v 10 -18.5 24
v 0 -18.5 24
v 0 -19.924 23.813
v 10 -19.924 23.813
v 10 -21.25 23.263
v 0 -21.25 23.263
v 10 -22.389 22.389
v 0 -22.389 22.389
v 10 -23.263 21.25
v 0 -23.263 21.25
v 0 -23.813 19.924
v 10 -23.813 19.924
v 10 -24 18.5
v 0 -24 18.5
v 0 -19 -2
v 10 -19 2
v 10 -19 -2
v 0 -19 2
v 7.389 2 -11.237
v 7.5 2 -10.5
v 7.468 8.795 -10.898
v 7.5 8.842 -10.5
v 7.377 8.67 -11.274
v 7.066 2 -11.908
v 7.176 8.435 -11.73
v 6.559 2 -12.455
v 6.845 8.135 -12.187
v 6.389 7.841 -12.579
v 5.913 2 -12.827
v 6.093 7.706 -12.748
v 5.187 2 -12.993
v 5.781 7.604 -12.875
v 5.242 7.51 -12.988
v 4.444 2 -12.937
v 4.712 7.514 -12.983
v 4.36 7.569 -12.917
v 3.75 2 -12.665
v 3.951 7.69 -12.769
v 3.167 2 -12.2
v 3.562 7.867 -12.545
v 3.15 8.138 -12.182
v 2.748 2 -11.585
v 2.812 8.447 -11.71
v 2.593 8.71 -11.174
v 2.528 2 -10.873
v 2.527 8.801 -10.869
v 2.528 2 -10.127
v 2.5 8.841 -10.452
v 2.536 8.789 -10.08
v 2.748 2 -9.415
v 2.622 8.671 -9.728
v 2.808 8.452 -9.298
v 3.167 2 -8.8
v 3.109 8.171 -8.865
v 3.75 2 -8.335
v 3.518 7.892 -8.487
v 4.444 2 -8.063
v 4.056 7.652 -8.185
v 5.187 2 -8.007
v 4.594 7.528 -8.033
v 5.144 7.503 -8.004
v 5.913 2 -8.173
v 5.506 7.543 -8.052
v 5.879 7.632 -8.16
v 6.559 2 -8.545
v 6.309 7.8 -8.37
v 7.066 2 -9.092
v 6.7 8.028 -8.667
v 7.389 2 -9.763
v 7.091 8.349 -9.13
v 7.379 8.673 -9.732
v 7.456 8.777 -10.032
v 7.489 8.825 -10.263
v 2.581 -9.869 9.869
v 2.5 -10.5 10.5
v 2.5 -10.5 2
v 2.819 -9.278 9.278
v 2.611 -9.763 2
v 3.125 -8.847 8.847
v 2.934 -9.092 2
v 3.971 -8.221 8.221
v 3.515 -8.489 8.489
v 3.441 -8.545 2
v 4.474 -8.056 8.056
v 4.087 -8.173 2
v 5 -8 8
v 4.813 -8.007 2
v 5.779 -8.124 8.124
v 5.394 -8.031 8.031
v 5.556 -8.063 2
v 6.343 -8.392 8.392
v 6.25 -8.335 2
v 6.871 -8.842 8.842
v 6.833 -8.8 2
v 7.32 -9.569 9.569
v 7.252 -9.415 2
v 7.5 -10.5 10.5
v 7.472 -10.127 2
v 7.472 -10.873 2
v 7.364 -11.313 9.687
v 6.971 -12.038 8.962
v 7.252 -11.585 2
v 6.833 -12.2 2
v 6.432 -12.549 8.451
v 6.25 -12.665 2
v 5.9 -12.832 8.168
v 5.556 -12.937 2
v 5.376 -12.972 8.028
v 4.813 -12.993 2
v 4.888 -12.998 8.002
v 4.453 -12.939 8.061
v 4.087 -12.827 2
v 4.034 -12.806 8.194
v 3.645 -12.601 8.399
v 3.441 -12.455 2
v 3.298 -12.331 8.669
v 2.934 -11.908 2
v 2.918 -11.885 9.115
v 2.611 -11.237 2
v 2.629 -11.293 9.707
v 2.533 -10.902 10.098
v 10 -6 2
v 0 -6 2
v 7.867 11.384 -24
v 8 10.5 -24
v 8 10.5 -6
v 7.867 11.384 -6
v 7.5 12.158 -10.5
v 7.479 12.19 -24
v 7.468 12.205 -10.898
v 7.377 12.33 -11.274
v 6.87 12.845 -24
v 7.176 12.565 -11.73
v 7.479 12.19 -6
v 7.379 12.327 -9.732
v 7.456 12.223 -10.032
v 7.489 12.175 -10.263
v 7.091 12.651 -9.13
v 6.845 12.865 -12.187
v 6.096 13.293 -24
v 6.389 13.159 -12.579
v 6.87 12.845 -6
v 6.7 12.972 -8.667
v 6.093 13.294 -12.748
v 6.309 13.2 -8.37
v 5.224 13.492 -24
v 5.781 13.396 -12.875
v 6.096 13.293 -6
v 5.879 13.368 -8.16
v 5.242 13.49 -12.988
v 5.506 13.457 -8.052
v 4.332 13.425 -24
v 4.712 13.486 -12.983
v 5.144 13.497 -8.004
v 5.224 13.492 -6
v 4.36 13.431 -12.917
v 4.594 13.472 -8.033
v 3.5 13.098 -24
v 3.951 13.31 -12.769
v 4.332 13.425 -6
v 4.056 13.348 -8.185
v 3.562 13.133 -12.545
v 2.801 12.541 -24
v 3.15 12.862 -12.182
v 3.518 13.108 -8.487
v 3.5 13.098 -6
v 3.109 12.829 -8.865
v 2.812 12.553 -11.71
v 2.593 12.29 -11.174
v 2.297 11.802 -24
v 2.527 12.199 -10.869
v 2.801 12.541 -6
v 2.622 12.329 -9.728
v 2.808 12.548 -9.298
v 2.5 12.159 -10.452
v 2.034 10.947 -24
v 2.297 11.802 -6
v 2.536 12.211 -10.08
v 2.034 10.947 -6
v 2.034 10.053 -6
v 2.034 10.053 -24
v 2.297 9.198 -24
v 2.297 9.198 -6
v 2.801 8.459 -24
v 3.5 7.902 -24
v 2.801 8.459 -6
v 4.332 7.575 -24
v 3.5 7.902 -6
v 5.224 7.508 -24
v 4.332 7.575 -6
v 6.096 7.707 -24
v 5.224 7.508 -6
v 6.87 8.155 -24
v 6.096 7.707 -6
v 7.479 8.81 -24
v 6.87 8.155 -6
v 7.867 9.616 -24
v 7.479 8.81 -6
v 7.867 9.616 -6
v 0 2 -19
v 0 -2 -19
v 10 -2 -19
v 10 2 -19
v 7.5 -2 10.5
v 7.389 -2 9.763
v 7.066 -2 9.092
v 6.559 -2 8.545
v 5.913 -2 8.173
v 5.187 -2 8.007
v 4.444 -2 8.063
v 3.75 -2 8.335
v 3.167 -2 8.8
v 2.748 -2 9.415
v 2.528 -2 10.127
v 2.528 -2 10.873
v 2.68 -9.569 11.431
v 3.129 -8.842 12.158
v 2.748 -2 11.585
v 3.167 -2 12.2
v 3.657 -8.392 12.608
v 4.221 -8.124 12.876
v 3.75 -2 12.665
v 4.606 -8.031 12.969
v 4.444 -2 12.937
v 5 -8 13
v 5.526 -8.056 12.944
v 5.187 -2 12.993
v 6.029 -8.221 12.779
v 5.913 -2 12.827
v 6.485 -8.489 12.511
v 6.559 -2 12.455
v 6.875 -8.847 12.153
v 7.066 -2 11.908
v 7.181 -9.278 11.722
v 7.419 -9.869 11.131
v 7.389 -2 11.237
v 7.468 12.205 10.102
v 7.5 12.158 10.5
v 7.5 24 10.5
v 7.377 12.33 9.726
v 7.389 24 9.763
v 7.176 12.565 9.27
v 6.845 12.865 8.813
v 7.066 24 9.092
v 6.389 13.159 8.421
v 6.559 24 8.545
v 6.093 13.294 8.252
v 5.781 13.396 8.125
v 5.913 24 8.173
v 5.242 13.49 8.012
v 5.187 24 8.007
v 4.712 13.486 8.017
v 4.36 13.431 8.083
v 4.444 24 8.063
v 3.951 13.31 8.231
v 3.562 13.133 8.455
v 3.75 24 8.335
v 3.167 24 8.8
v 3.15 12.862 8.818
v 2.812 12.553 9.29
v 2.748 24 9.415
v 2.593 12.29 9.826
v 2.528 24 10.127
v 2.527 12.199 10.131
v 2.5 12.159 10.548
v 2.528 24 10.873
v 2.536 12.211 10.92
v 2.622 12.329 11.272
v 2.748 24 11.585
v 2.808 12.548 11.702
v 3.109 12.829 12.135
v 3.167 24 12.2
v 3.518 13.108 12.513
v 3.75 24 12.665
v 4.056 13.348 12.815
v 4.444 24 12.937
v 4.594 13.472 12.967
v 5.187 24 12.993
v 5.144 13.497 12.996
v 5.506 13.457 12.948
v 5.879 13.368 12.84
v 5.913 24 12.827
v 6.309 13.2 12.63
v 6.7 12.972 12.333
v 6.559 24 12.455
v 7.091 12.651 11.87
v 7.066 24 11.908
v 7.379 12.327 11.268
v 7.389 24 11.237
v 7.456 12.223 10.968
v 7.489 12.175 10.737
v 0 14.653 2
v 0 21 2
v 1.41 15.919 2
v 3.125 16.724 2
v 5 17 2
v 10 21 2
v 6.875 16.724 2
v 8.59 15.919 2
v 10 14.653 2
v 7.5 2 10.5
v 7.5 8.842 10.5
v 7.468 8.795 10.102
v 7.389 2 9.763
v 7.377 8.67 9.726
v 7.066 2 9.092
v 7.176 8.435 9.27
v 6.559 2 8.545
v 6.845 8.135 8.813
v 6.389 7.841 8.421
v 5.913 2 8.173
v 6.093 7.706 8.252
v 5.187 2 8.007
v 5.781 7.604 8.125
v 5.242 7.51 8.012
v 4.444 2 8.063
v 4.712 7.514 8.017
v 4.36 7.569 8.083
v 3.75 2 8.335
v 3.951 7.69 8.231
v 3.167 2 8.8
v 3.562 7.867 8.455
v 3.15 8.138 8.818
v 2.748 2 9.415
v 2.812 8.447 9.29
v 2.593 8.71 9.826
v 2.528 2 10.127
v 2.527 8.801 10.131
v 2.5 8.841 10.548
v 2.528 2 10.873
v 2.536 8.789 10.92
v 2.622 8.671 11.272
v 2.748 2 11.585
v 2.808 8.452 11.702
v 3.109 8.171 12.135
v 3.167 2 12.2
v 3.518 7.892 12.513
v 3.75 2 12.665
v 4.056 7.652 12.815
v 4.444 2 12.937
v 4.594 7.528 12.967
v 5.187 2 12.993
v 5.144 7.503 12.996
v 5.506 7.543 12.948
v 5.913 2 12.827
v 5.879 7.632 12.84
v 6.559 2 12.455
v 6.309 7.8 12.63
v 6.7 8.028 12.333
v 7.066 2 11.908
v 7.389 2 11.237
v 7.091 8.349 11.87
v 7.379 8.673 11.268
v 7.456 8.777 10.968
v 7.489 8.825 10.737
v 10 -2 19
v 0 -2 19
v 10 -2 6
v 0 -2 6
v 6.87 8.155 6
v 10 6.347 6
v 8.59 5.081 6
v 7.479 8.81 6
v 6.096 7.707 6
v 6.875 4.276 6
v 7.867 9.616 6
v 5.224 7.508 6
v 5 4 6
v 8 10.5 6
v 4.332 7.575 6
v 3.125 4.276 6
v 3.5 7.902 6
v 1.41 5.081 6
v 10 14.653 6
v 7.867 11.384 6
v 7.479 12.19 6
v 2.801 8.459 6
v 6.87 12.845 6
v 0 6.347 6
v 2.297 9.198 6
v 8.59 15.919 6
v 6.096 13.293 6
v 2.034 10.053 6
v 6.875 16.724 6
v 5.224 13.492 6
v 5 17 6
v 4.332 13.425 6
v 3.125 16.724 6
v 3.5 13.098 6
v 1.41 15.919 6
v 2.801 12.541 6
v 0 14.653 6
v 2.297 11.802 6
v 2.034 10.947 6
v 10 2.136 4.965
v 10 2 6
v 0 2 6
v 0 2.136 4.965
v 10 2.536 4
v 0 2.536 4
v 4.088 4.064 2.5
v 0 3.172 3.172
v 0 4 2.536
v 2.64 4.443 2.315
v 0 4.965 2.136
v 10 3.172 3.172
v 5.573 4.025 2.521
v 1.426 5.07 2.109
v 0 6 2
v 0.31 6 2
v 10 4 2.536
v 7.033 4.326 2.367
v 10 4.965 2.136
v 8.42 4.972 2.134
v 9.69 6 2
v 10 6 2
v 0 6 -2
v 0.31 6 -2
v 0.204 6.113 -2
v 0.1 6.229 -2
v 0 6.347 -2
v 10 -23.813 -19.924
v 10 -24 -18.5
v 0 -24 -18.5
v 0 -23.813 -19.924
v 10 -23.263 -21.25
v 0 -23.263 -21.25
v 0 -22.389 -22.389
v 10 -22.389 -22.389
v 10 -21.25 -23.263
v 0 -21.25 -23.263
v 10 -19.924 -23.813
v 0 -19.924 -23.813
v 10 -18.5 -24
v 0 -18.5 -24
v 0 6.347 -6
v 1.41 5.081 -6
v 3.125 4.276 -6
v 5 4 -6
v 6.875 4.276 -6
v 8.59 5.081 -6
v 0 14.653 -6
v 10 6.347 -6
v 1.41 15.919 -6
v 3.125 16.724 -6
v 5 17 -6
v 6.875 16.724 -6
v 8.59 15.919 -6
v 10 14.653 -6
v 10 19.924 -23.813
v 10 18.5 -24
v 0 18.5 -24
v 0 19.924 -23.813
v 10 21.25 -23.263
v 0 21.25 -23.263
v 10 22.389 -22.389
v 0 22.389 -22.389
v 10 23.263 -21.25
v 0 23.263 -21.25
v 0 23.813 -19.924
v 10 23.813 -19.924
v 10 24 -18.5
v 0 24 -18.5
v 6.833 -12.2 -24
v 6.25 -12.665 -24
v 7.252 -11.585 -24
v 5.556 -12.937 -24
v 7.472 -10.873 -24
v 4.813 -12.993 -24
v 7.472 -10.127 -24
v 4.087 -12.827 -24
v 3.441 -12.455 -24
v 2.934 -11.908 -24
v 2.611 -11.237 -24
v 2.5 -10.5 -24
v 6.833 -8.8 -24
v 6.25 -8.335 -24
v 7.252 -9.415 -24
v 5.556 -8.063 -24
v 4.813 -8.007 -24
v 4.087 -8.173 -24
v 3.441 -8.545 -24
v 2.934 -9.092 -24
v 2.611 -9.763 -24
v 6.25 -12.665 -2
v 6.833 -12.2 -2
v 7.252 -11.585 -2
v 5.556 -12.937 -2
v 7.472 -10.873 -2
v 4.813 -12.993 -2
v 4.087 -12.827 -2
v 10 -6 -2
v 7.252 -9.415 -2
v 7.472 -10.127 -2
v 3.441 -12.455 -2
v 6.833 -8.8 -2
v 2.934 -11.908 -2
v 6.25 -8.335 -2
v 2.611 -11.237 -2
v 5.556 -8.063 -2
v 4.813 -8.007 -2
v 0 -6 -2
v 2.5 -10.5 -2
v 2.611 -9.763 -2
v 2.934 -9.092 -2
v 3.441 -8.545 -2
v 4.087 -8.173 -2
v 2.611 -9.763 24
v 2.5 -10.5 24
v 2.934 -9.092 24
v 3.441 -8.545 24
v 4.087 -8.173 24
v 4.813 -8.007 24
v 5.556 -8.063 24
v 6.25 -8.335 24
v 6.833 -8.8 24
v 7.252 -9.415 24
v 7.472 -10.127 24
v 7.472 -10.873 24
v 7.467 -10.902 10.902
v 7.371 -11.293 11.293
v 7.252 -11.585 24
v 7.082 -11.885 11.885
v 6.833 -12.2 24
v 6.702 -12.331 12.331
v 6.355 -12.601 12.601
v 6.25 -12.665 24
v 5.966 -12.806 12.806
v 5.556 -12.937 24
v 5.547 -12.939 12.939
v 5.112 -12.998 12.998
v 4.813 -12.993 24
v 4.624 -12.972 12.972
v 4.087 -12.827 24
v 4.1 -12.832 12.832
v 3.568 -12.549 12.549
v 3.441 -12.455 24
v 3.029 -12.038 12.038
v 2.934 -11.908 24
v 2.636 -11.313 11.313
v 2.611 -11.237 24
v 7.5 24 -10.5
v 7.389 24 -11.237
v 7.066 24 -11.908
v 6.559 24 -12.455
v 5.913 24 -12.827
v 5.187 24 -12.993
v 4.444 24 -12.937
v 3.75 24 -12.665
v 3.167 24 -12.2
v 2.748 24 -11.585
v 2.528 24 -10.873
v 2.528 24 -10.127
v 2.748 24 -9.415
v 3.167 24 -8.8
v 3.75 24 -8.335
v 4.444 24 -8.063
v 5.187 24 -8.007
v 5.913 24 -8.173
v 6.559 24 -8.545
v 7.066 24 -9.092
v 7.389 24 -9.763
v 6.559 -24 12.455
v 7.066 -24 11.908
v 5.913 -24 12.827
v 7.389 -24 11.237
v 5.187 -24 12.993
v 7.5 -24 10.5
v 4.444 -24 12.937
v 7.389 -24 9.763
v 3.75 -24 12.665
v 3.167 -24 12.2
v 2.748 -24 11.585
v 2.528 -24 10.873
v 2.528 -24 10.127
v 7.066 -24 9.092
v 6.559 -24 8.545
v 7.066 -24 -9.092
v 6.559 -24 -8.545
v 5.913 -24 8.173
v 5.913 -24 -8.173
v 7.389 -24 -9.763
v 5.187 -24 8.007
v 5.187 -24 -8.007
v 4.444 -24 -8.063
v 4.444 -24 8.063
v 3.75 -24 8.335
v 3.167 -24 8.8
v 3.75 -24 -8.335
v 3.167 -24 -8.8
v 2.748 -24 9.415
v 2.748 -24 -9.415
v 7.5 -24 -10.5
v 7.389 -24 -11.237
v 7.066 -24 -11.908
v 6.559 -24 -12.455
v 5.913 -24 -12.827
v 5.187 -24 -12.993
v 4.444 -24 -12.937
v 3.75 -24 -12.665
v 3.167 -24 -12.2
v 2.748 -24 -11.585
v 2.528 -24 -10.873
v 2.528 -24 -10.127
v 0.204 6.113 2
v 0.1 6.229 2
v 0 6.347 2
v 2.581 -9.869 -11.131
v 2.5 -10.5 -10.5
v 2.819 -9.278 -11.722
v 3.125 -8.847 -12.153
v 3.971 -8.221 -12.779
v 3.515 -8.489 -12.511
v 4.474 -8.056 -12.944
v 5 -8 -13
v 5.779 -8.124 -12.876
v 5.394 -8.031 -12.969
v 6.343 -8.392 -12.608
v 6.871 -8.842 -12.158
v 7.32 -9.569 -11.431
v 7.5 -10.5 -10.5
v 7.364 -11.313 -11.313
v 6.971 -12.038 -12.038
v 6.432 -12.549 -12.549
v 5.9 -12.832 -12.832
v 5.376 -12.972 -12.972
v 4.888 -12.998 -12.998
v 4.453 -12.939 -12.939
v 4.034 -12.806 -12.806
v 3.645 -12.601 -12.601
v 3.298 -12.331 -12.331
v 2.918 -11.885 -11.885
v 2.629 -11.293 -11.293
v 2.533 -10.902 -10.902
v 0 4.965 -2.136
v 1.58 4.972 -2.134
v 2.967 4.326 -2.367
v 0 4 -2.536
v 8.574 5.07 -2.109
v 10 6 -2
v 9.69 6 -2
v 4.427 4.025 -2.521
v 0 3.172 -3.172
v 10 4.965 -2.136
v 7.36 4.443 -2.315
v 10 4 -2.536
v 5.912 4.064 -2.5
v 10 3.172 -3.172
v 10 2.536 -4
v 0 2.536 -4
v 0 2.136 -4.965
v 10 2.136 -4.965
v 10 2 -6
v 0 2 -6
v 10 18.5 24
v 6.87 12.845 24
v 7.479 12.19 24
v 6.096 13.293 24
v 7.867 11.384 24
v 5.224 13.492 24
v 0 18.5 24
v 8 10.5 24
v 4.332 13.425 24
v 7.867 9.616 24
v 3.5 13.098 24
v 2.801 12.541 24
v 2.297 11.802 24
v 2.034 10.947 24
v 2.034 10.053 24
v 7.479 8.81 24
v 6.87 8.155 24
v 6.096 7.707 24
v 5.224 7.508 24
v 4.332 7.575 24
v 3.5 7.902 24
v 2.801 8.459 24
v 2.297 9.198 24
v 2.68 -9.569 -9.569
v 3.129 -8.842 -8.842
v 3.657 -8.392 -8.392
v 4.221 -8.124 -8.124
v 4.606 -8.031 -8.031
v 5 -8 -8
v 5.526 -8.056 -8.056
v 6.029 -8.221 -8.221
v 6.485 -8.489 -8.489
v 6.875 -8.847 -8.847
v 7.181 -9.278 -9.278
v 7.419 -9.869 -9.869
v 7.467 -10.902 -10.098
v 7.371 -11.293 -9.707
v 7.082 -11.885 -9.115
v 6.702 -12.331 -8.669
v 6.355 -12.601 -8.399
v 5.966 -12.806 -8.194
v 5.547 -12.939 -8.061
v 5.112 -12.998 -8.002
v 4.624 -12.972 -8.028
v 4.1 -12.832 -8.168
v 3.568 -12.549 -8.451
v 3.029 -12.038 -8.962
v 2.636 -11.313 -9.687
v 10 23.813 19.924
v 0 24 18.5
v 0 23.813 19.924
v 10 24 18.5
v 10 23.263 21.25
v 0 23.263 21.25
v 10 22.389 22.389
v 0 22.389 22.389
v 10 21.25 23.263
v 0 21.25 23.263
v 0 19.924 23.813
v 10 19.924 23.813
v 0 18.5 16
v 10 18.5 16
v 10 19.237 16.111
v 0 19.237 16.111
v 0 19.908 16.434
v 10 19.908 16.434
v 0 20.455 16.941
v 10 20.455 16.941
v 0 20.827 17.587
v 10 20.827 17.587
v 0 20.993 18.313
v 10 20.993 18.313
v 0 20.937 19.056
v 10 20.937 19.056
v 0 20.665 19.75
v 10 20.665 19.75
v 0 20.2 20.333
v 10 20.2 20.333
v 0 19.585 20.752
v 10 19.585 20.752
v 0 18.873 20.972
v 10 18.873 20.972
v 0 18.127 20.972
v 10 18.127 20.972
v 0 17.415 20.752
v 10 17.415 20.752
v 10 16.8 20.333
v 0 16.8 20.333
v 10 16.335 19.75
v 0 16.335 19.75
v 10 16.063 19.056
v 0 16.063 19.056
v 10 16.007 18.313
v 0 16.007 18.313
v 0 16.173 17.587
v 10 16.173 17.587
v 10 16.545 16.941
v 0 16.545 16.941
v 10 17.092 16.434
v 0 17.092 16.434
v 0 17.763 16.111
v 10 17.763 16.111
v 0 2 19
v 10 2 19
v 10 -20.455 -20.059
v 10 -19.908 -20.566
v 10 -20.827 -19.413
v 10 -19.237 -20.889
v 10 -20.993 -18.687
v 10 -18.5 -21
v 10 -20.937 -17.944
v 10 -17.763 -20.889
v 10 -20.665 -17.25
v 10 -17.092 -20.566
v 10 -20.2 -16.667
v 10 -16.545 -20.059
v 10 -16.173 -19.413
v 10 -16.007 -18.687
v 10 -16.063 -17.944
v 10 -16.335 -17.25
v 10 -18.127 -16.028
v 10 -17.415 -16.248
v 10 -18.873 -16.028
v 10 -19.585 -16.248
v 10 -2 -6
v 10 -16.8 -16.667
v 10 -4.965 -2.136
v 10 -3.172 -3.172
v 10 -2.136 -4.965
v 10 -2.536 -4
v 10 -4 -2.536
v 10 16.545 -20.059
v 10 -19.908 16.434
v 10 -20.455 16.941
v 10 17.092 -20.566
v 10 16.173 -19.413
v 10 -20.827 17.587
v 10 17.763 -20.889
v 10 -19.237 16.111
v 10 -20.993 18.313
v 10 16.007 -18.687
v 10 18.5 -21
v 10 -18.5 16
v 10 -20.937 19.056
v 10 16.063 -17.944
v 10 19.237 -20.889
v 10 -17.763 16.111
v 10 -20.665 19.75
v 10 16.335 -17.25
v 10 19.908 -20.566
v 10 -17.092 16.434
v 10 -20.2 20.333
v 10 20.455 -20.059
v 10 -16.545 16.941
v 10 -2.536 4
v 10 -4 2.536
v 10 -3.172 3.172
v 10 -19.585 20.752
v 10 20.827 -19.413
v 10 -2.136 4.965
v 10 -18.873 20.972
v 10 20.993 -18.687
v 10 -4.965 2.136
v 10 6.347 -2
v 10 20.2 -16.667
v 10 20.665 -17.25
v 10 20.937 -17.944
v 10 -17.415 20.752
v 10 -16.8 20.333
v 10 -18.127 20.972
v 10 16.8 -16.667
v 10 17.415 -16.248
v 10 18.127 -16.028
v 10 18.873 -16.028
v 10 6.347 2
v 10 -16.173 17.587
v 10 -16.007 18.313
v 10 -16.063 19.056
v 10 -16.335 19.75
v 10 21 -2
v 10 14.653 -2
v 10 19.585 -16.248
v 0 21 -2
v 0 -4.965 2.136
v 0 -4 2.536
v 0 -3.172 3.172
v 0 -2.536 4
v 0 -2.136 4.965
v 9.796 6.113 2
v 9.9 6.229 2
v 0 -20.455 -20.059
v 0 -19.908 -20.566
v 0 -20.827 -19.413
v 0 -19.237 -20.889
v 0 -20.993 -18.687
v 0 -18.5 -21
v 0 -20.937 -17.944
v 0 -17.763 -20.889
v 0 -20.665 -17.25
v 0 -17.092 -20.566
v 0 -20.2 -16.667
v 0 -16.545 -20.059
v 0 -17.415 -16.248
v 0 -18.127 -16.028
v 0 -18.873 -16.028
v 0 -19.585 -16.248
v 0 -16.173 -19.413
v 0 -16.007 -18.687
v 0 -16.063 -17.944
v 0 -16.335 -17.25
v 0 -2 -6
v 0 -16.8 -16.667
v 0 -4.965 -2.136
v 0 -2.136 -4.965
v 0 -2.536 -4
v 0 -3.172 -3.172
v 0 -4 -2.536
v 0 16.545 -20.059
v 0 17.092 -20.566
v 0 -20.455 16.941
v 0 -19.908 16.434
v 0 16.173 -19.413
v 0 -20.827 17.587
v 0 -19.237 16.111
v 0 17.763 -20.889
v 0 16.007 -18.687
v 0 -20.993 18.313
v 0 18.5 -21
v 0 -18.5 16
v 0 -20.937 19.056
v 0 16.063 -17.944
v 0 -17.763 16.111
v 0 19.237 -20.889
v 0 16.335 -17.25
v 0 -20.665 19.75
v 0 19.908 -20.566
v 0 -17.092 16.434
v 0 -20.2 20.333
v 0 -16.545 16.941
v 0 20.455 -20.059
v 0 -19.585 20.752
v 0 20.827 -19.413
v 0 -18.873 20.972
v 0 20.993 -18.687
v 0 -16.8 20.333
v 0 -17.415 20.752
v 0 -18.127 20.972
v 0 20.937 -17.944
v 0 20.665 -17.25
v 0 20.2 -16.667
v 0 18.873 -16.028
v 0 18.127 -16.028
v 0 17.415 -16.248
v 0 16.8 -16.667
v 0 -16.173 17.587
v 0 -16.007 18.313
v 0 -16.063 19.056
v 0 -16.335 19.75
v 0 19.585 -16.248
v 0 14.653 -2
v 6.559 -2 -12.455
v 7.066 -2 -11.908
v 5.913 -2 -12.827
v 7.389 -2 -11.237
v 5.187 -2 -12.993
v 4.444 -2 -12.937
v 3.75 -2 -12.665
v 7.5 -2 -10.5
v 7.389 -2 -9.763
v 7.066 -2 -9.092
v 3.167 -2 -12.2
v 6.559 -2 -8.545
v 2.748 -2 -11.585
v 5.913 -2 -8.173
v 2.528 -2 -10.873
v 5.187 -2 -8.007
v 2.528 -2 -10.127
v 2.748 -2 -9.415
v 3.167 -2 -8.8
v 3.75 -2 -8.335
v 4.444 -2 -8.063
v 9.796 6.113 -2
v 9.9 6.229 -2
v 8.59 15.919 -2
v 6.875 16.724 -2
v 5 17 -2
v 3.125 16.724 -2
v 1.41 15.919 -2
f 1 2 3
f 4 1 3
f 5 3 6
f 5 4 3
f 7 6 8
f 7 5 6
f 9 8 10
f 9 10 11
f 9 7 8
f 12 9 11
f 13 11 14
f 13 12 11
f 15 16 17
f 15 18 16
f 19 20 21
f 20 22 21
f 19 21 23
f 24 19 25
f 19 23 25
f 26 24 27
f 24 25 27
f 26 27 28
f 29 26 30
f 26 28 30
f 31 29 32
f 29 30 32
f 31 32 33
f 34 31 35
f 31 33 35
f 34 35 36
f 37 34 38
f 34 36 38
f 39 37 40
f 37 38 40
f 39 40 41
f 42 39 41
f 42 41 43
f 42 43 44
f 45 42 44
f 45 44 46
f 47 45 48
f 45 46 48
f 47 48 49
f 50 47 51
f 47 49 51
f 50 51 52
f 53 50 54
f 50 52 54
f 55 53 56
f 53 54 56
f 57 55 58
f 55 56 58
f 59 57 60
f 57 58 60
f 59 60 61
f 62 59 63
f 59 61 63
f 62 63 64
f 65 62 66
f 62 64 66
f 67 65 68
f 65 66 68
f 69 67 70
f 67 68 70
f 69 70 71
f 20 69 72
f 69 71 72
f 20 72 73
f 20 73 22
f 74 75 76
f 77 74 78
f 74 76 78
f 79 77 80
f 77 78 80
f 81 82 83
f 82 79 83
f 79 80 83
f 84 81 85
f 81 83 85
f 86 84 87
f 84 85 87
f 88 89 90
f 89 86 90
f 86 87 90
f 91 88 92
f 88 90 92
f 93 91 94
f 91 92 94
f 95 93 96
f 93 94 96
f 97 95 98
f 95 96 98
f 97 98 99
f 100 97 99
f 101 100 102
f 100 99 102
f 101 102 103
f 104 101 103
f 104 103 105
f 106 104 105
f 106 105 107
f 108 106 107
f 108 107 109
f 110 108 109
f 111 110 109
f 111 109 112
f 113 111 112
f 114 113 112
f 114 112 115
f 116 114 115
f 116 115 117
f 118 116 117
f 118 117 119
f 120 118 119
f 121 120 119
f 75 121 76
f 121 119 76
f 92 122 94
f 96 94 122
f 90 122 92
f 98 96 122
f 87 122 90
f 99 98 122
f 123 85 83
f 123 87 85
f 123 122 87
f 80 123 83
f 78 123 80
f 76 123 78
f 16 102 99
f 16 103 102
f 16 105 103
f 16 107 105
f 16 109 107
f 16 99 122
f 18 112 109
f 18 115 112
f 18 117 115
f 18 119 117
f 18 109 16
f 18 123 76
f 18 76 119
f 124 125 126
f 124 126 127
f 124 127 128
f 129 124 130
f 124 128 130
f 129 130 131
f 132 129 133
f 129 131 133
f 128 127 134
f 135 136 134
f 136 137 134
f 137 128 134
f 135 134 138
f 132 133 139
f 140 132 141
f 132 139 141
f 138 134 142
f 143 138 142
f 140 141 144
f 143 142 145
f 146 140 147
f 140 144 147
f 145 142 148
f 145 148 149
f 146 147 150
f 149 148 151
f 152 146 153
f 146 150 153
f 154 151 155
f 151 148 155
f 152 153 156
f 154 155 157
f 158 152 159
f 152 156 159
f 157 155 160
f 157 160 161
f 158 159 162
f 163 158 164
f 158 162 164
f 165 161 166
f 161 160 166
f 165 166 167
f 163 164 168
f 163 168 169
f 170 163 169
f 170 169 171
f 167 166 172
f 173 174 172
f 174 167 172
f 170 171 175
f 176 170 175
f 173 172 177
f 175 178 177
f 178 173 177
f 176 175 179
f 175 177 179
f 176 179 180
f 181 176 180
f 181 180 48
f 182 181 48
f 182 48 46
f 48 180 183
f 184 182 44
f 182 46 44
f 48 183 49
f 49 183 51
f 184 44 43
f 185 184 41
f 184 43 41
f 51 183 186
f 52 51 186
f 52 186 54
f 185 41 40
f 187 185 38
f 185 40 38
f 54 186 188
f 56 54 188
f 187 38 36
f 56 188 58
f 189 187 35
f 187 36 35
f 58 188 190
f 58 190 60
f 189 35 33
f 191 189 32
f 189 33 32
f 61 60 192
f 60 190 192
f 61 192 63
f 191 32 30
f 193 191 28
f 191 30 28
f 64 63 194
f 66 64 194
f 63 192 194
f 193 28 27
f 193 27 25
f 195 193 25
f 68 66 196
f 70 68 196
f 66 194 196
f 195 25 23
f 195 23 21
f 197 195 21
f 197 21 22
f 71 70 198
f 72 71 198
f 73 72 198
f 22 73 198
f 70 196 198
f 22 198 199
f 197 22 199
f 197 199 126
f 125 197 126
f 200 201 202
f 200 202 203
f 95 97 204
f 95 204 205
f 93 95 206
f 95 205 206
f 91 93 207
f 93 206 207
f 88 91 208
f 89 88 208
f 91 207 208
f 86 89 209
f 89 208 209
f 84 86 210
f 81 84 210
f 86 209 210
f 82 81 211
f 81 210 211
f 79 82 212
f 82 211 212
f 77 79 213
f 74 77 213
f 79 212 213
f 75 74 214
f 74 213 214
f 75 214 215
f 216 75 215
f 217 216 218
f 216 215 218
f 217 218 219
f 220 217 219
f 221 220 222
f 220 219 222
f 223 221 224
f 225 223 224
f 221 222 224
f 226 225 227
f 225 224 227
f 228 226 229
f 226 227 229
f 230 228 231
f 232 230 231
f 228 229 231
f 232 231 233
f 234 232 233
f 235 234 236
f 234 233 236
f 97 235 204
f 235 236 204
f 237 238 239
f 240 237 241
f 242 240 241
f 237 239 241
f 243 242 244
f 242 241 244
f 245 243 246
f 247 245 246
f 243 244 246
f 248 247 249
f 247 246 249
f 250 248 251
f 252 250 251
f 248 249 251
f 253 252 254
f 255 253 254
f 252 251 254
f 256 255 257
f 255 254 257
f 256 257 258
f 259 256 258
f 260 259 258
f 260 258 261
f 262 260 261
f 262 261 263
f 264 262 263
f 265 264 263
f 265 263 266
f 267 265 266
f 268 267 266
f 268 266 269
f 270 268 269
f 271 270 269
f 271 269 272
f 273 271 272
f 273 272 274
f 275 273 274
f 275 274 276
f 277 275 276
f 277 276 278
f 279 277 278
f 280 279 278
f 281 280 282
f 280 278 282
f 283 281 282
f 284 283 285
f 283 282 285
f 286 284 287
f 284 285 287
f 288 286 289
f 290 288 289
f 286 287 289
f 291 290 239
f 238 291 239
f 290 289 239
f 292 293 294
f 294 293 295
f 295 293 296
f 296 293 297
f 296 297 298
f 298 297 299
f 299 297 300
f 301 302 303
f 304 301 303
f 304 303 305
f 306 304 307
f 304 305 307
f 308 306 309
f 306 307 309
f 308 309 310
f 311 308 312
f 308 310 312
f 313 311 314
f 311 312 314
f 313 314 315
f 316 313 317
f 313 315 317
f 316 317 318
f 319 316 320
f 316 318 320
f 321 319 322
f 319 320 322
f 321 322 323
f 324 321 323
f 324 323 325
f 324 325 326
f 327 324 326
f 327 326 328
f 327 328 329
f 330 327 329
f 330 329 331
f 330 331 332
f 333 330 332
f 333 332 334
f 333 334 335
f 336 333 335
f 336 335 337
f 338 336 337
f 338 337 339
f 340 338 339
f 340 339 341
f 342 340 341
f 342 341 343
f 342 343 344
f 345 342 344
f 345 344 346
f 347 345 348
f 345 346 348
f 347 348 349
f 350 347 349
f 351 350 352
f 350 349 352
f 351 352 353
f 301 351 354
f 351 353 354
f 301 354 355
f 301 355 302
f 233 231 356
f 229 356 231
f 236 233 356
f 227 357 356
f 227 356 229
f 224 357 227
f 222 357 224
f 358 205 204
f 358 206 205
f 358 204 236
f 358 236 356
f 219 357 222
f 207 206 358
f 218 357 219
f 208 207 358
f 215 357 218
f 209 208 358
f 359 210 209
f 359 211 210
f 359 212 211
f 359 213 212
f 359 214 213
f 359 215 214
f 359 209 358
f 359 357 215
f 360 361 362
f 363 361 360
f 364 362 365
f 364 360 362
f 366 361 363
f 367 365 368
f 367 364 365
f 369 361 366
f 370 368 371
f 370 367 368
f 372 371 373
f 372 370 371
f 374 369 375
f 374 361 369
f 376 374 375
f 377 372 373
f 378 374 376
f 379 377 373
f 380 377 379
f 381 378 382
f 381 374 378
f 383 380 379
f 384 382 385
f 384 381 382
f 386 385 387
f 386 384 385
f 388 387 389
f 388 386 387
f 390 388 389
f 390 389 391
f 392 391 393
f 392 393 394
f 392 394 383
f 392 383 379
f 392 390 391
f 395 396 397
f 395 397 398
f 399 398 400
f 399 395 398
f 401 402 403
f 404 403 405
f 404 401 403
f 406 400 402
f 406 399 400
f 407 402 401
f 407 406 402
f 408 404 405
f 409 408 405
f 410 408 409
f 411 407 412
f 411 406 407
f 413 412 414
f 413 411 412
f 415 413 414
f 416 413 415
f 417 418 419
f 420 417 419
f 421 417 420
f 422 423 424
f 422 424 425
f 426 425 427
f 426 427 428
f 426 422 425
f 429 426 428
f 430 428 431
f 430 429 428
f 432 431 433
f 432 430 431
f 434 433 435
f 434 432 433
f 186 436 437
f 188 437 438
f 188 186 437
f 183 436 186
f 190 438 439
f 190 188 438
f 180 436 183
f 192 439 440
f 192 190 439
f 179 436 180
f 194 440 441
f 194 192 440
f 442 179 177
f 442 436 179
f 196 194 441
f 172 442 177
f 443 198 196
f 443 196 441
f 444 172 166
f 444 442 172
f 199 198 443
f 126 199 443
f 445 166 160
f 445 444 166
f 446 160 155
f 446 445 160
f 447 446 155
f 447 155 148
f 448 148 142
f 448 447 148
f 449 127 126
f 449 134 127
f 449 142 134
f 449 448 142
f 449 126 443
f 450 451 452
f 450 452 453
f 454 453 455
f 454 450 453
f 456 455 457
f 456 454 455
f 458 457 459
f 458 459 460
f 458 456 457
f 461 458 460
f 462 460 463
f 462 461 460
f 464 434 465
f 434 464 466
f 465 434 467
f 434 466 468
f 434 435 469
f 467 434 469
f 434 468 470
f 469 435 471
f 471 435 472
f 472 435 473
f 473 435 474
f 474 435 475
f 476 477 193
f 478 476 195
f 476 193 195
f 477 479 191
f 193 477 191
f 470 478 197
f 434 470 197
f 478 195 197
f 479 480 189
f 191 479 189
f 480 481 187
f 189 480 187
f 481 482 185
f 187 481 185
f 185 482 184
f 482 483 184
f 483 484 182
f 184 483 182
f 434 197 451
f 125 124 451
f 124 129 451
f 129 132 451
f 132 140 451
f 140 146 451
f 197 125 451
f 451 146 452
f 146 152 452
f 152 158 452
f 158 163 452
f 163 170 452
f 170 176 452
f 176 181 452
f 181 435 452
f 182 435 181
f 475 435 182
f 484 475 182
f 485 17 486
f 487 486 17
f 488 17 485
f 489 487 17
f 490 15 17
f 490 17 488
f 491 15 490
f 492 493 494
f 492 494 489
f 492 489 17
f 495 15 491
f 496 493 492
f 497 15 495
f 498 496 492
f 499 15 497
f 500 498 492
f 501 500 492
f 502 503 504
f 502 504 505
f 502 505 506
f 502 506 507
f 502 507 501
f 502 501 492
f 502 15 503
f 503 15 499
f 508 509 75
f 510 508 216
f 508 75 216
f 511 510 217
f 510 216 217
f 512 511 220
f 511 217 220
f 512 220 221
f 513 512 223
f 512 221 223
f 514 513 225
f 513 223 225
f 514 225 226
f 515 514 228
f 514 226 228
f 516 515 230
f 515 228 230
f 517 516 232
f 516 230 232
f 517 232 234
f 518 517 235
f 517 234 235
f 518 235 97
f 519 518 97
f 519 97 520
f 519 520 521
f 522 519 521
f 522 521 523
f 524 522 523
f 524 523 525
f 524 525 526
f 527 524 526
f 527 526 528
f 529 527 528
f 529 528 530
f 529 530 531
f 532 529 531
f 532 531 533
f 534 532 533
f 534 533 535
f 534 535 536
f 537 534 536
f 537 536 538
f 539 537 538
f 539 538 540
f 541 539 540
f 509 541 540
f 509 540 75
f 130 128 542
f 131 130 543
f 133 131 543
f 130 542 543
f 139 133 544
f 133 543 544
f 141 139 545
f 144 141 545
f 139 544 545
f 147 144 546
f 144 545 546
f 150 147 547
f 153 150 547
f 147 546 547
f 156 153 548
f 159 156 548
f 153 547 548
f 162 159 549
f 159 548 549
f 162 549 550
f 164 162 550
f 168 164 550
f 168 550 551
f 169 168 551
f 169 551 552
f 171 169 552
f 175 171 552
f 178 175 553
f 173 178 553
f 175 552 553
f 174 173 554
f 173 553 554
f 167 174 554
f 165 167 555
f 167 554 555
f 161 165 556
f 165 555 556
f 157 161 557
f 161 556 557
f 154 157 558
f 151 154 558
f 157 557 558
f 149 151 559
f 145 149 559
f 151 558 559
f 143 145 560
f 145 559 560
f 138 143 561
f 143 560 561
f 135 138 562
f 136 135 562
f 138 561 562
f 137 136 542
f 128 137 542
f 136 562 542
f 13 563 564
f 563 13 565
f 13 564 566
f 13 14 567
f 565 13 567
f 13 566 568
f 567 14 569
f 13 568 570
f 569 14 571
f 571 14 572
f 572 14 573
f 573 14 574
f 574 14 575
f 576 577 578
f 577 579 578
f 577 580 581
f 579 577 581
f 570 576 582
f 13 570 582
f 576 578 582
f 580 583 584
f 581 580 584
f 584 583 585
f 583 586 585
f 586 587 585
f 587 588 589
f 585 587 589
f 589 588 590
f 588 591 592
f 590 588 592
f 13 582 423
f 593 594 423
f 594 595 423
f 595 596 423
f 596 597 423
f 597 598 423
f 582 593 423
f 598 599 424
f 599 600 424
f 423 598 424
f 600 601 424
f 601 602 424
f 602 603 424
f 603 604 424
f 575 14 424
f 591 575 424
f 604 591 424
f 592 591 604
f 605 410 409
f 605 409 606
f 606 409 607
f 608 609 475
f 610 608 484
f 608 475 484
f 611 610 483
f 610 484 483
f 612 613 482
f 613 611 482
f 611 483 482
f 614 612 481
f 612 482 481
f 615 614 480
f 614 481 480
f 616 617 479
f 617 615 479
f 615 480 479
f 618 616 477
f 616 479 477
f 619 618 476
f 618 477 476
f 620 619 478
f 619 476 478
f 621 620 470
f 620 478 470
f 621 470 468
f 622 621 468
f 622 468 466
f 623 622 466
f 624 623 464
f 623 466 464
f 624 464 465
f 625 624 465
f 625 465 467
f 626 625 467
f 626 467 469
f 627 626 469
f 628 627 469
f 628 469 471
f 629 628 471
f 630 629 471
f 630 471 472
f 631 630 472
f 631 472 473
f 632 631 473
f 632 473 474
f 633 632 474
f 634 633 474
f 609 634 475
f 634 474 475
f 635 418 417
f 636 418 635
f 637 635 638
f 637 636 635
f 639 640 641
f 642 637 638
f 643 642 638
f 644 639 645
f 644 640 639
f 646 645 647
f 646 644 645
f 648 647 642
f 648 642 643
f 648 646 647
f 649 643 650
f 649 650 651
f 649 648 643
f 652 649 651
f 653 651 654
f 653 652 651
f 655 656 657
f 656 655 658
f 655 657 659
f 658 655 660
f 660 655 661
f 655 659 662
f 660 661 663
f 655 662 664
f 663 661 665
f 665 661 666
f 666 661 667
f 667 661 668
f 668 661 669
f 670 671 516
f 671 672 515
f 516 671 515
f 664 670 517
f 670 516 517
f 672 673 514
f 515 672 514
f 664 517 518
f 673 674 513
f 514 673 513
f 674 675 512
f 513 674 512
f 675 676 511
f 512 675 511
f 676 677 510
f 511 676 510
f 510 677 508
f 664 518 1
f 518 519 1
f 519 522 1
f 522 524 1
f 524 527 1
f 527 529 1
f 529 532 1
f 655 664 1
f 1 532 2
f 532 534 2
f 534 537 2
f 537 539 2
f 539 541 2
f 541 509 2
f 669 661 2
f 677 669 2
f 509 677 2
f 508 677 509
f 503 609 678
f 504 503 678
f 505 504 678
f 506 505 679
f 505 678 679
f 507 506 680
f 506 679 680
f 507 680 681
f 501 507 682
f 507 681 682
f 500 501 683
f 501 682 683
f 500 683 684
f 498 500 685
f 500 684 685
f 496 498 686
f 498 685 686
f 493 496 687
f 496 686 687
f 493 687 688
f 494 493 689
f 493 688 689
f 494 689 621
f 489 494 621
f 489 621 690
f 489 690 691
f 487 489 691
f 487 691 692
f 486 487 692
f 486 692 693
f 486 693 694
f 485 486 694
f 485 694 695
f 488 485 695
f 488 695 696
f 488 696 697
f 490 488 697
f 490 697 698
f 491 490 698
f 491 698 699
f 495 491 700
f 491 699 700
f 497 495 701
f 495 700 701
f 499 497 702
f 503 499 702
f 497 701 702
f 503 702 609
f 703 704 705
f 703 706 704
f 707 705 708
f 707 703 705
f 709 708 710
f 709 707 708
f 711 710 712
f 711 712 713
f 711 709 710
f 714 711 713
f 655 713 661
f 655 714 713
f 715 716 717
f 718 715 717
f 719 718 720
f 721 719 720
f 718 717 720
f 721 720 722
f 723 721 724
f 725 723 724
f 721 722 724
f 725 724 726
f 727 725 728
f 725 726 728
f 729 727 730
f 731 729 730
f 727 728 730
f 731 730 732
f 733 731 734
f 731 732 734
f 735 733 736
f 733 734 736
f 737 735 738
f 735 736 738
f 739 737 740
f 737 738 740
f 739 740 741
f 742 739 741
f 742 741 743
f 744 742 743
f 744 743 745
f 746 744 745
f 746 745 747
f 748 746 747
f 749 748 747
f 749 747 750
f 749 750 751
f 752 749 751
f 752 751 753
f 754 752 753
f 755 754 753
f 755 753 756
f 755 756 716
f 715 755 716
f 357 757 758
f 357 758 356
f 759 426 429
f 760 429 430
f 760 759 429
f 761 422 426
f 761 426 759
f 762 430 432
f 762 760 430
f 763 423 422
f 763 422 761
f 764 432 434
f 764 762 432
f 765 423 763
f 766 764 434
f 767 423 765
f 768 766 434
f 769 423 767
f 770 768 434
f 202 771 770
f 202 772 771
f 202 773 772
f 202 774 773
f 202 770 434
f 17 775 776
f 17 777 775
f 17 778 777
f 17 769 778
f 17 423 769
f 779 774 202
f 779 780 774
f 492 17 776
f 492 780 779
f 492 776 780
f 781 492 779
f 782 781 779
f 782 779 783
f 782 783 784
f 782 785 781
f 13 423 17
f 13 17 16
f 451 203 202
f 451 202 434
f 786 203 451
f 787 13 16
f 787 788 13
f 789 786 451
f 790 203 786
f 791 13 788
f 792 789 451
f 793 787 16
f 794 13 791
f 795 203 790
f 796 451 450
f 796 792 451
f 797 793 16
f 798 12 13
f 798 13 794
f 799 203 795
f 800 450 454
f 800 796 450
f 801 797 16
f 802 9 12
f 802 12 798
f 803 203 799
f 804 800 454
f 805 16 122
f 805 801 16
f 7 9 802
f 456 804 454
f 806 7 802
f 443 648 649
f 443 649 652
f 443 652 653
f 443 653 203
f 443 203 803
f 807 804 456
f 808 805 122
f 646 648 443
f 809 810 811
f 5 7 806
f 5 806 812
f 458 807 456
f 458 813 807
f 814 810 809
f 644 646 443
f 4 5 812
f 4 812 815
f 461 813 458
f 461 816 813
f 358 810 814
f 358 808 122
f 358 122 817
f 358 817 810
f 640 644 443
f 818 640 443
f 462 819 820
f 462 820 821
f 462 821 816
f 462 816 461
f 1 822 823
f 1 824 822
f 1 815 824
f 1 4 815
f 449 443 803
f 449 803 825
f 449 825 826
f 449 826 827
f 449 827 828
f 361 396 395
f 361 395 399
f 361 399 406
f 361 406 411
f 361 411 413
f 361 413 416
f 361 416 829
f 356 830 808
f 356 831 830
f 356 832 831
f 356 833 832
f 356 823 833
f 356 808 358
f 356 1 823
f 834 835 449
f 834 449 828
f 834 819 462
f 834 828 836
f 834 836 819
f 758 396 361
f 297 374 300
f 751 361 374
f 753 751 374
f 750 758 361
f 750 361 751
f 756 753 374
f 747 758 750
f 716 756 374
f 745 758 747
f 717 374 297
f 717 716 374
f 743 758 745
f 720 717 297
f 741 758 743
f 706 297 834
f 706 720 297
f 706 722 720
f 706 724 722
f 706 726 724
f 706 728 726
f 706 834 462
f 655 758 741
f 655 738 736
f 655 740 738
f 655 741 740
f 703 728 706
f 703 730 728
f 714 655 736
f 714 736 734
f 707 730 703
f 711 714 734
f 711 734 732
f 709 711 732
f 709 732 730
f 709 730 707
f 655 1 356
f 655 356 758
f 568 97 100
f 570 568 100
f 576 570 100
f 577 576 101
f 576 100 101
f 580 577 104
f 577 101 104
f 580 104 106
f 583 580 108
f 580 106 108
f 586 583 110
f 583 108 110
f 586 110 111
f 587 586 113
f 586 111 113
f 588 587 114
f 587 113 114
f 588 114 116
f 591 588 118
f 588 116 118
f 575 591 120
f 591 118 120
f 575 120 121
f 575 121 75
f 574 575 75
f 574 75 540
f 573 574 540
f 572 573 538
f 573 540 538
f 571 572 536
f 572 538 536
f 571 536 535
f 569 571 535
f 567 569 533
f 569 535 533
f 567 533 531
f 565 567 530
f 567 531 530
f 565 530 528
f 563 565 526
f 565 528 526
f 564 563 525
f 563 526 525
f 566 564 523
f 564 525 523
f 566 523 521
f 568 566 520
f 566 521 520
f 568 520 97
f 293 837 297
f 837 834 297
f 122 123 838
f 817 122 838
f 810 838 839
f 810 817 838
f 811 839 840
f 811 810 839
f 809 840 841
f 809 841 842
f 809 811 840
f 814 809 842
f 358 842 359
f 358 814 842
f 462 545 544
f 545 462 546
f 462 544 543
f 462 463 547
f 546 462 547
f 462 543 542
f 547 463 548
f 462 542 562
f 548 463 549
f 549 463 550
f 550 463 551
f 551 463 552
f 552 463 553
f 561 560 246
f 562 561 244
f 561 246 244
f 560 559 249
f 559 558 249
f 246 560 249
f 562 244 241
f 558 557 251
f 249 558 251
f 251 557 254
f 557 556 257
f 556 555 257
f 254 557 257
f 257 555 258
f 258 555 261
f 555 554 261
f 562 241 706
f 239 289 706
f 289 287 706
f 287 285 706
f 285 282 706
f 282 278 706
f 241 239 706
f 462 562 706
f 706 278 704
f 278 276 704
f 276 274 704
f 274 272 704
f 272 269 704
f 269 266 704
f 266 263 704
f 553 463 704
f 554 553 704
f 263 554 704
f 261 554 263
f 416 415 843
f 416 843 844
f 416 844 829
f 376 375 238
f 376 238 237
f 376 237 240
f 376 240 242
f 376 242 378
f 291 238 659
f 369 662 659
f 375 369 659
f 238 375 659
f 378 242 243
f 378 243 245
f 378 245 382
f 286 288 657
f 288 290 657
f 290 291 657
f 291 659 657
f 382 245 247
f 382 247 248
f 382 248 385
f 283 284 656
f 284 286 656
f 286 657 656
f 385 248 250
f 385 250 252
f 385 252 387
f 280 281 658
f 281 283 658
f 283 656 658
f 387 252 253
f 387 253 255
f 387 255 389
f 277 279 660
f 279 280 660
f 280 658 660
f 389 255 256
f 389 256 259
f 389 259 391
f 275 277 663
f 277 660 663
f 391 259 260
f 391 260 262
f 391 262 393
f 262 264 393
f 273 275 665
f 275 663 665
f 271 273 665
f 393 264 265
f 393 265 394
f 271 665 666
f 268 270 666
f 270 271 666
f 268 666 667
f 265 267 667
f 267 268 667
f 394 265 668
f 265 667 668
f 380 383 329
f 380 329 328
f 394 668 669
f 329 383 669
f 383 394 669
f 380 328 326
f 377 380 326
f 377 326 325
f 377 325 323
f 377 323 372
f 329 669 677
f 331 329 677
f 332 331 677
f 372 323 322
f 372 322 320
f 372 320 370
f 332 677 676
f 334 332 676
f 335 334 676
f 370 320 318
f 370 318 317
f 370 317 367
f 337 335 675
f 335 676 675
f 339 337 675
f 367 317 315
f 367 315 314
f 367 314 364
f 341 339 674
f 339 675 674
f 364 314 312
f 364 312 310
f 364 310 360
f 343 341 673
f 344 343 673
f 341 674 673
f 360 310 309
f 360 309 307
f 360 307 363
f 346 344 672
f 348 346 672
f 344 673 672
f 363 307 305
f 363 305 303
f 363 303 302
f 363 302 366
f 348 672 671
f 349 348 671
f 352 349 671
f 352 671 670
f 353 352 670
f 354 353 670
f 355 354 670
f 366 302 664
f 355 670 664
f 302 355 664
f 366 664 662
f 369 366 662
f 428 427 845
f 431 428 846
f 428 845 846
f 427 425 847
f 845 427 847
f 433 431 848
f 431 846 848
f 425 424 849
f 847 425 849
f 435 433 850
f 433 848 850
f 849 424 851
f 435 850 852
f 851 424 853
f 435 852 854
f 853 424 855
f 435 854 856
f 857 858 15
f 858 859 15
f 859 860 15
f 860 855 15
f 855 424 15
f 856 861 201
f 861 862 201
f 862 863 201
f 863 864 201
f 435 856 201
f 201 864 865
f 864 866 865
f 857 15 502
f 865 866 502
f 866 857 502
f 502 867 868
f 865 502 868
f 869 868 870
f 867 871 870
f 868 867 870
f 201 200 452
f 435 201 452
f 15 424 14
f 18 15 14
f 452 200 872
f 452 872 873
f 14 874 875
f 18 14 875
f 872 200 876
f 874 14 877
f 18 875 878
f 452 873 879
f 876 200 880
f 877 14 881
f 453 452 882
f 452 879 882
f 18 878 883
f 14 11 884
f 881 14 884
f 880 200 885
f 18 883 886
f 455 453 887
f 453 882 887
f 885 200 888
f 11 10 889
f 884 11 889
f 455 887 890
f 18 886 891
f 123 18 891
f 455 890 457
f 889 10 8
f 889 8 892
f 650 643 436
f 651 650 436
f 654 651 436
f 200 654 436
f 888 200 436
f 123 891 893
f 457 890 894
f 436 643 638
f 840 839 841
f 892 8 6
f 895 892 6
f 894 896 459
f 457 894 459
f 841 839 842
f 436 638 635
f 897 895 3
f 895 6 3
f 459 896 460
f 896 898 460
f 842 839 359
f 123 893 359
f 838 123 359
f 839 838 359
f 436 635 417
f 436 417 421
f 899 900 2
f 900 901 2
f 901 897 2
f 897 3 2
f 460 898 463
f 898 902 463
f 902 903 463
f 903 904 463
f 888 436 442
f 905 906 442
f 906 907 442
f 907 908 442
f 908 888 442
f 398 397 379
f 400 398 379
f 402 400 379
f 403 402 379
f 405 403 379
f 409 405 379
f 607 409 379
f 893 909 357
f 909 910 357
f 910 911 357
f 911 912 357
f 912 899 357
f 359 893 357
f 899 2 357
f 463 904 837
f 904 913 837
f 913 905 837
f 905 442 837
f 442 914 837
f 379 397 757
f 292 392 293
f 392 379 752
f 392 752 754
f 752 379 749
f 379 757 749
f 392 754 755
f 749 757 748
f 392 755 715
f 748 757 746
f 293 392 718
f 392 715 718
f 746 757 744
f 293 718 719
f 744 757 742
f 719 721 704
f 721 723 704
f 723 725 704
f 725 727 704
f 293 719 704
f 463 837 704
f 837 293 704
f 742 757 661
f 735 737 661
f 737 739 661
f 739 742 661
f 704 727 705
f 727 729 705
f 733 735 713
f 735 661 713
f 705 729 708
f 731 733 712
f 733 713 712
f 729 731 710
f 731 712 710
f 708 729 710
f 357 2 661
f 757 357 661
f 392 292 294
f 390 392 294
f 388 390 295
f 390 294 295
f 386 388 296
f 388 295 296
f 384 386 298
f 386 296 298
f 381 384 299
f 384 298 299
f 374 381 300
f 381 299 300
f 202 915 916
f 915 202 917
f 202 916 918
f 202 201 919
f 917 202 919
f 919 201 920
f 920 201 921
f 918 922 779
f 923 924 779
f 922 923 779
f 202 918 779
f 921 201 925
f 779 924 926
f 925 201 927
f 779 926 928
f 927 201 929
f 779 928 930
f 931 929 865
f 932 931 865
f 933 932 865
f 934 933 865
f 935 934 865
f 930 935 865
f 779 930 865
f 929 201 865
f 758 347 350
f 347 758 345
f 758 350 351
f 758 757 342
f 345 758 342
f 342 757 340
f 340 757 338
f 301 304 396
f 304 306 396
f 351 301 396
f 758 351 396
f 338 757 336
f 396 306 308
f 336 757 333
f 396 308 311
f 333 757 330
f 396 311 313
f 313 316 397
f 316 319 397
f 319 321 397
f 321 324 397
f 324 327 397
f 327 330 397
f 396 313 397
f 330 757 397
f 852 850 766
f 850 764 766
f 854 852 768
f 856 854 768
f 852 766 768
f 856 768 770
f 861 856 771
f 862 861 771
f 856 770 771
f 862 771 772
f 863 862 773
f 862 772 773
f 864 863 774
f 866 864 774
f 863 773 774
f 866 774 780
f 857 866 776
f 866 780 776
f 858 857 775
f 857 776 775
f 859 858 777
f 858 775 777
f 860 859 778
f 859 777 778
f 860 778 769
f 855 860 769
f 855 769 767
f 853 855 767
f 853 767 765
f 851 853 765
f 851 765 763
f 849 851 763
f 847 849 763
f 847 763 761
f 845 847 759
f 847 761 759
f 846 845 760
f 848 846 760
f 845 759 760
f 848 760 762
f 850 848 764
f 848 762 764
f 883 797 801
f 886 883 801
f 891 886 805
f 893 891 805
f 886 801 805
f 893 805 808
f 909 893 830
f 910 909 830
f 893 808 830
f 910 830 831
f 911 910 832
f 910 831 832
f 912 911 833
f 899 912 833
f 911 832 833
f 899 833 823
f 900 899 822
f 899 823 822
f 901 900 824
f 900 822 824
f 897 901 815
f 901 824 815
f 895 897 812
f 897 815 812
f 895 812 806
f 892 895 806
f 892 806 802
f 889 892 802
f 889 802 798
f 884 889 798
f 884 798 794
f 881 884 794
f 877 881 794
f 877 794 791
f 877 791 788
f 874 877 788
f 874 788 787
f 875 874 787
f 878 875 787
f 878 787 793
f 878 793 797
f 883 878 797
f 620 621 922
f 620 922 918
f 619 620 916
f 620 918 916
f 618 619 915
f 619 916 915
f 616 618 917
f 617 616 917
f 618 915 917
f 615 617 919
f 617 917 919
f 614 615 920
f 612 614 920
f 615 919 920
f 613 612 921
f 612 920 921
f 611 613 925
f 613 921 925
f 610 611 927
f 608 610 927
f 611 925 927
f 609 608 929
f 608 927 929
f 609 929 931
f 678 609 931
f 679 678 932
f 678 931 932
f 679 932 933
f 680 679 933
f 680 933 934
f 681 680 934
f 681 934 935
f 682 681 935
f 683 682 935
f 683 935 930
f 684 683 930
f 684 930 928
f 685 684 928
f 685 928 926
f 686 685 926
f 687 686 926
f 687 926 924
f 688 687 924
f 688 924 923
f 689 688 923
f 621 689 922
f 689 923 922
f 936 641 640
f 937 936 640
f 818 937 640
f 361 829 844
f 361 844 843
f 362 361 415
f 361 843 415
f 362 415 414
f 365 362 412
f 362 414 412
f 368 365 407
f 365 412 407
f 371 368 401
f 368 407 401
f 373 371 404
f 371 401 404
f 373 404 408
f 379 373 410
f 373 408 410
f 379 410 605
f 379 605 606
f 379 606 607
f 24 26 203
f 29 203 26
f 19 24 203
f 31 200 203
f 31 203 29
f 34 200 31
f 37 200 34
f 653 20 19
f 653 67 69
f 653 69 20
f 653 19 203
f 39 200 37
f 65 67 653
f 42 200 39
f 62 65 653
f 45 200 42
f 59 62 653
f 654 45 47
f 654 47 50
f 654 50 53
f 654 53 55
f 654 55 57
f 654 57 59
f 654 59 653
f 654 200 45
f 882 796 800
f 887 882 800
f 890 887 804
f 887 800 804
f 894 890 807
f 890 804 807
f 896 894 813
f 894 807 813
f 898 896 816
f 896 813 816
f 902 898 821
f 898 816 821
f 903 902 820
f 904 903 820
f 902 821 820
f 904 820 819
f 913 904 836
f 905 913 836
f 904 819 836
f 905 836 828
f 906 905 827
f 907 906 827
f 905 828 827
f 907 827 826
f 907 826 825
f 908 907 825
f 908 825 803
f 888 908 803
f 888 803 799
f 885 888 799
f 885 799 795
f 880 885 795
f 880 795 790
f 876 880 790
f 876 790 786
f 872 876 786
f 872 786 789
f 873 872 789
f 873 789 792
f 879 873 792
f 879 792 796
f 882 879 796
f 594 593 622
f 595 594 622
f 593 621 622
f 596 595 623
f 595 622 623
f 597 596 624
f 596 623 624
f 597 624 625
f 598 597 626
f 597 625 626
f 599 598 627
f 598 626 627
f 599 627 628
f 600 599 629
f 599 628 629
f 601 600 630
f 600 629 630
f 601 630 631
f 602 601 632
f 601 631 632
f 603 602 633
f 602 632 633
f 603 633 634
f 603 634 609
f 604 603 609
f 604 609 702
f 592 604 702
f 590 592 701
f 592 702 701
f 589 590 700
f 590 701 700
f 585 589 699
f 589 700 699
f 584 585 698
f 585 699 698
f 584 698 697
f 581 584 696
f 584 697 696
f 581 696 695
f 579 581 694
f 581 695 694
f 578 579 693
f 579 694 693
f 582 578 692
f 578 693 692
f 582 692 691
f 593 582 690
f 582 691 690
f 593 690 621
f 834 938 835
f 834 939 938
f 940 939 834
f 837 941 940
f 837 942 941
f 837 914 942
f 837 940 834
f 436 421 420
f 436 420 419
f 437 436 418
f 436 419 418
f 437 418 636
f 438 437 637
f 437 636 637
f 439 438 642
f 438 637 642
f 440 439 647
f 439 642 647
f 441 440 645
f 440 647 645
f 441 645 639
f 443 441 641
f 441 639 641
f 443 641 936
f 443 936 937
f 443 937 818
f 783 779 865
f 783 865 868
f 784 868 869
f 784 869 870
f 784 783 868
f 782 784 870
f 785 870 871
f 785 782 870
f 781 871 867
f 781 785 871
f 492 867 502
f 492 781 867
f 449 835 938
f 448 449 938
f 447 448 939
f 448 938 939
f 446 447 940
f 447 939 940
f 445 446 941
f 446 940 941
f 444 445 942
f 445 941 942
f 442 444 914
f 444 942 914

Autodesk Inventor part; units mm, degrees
ref_plane "YZ Plane" through (0, 0, 0) normal (1, 0, 0) x (0, 1, 0)
ref_plane "XZ Plane" through (0, 0, 0) normal (0, 1, 0) x (-1, 0, 0)
ref_plane "XY Plane" through (0, 0, 0) normal (0, 0, 1) x (1, 0, 0)
sketch "Sketch1" plane through (0, 0, 0) normal (1, 0, 0) x (0, 1, 0)
  circle A0 centre (0, 0) radius 2.8284
  line L0 (0, 0) -> (-2.8284, 0)
  line L1 (-2.8284, 0) -> (-2.8284, -2.8284)
  line L2 (-2.8284, -2.8284) -> (0, -2.8284)
  line L3 (0, -2.8284) -> (0, 0)
  line L4 (0, 0) -> (-2.8284, -2.8284)
  line L5 (2, 2) -> (-2, 2)
  line L6 (-2, 2) -> (-2, -2)
  line L7 (-2, -2) -> (2, -2)
  line L8 (2, -2) -> (2, 2)
  line L9 (2, 2) -> (-2, -2) construction
  line L10 (-2, 2) -> (2, -2) construction
  line L11 (2, 2) -> (-2, 2)
  line L12 (-2, 2) -> (-2, 4)
  line L13 (-2, 4) -> (2, 4)
  line L14 (2, 4) -> (2, 2)
  line L15 (0, 4) -> (0, 19)
  line L16 (-2, 2) -> (-4, 2)
  line L17 (-4, 2) -> (-4, -2)
  line L18 (-4, -2) -> (-2, -2)
  line L19 (-4, 0) -> (-19, 0)
  line L20 (19, -19) -> (19, 19)
  line L21 (19, 19) -> (-19, 19)
  line L22 (-19, 19) -> (-19, -19)
  line L23 (-19, -19) -> (19, -19)
  line L24 (19, -19) -> (-19, 19) construction
  line L25 (19, 19) -> (-19, -19) construction
  line L26 (0, 19) -> (0, 24)
  line L27 (-19, 0) -> (-24, 0)
  line L28 (24, -24) -> (24, 24)
  line L29 (24, 24) -> (-24, 24)
  line L30 (-24, 24) -> (-24, -24)
  line L31 (-24, -24) -> (24, -24)
  line L32 (24, -24) -> (-24, 24) construction
  line L33 (24, 24) -> (-24, -24) construction
  line L34 (-2, 2) -> (-19, 2)
  line L35 (-19, -2) -> (-2, -2)
  line L36 (-2, -2) -> (-2, 2)
  line L37 (-2, -2) -> (-19, -2)
  line L38 (-19, -2) -> (-19, -19)
  line L39 (-19, -19) -> (-2, -19)
  line L40 (-2, -19) -> (-2, -2)
  line L41 (2, -2) -> (19, -2)
  line L42 (19, -2) -> (19, -19)
  line L43 (19, -19) -> (2, -19)
  line L44 (2, -19) -> (2, -2)
  line L45 (2, 2) -> (19, 2)
  line L46 (19, 2) -> (19, 19)
  line L47 (19, 19) -> (2, 19)
  line L48 (2, 19) -> (2, 2)
  line L49 (-2, 2) -> (-19, 2)
  line L50 (-19, 2) -> (-19, 19)
  line L51 (-19, 19) -> (-2, 19)
  line L52 (-2, 19) -> (-2, 2)
  point P0 (-2, 19)
  point P1 (2, 4)
  point P2 (2, -19)
  point P3 (-2, -19)
  dimension "d0" = 4
  dimension "d1" = 2
  dimension "d5" = 15
  dimension "d6" = 2
  dimension "d7" = 15
  dimension "d8" = 2
  dimension "d9" = 0
  dimension "d10" = 5
  dimension "d11" = 5
  dimension "d12" = 15
  dimension "d13" = 22.6716
  dimension "d14" = 20
  dimension "d15" = 29.7321
extrude "Extrusion1" add sketch "Sketch1" along normal blind 10 contours L14 L48 L21 L20 L45 | L41 L20 L23 L44 | L16 L34 L22 L21 L52 L12 | L20 L21 L26 L29 L28 L31 L30 L27 L22 L23 | L40 L2 L4 | L4 L1 L18 | L40 L23 L22 L35 L18 L1 L2 | L21 L22 L27 L30 L29 L26
sketch "Sketch2" plane through (0, 24, 24) normal (0, 1, 0) x (1, 0, 0)
  line L0 (10, 0) -> (0, 0) projected
  line L1 (0, 0) -> (0, 48) projected
  line L2 (0, 48) -> (10, 48) projected
  line L3 (10, 48) -> (10, 0) projected
  line L4 (0, 48) -> (10, 48) projected
  line L5 (0, 48) -> (0, 34.5)
  line L6 (0, 34.5) -> (5, 34.5)
  circle A0 centre (5, 34.5) radius 2.5
  line L7 (0, 0) -> (0, 13.5)
  line L8 (0, 22) -> (0, 5) projected
  line L9 (0, 13.5) -> (5, 13.5)
  circle A1 centre (5, 13.5) radius 2.5
  point P0 (0, 24)
  dimension "d18" = 13.5
  dimension "d19" = 5
  dimension "d20" = 5
  dimension "d21" = 13.5
  dimension "d22" = 5
  dimension "d23" = 5
extrude "Extrusion2" cut sketch "Sketch2" against normal through all contours A0 | A1
sketch "Sketch3" plane through (0, -24, -24) normal (0, 0, -1) x (-1, 0, 0)
  line L0 (0, 0) -> (-10, 0) projected
  line L1 (0, 0) -> (0, 13.5)
  line L2 (0, 22) -> (0, 5) projected
  line L3 (0, 48) -> (-10, 48) projected
  line L4 (0, 48) -> (0, 34.5)
  line L5 (0, 0) -> (0, 48) projected
  line L6 (0, 34.5) -> (-5, 34.5)
  line L7 (0, 13.5) -> (-5, 13.5)
  circle A0 centre (-5, 13.5) radius 2.5
  circle A1 centre (-5, 34.5) radius 2.5
  point P0 (0, 24)
  dimension "d26" = 13.5
  dimension "d27" = 13.5
  dimension "d28" = 5
  dimension "d29" = 5
  dimension "d30" = 5
  dimension "d31" = 5
extrude "Extrusion3" cut sketch "Sketch3" against normal through all
fillet "Fillet1" radius 4 4 edges at (5, -2, 2) (5, 2, 2) (5, 2, -2) (5, -2, -2)
sketch "Sketch4" plane through (10, 0, 0) normal (1, 0, 0) x (0, 0, -1)
  line L0 (24, 24) -> (-24, 24) projected
  line L1 (24, 24) -> (18.5, 24)
  line L2 (18.5, 24) -> (18.5, 18.5)
  line L3 (18.5, 18.5) -> (24, 18.5)
  line L4 (24, 18.5) -> (24, 24)
  circle A0 centre (18.5, 18.5) radius 2.5
  circle A1 centre (18.5, 18.5) radius 5.5
  circle A2 centre (-18.5, 18.5) radius 5.5
  circle A3 centre (-18.5, 18.5) radius 2.5
  line L5 (-18.5, 24) -> (-24, 24)
  line L6 (-24, 24) -> (-24, 18.5)
  circle A4 centre (-18.5, -18.5) radius 5.5
  circle A5 centre (-18.5, -18.5) radius 2.5
  line L7 (-24, -18.5) -> (-24, -24)
  line L8 (-24, -24) -> (-18.5, -24)
  circle A6 centre (18.5, -18.5) radius 5.5
  circle A7 centre (18.5, -18.5) radius 2.5
  line L9 (18.5, -24) -> (24, -24)
  line L10 (24, -24) -> (24, -18.5)
  point P0 (0, 0)
  point P1 (-18.5, 24)
  dimension "d35" = 5.5
  dimension "d36" = 5.5
  dimension "d37" = 5
  dimension "d40" = 360
extrude "Extrusion4" cut sketch "Sketch4" against normal through all contours L4 A1 L0 | A2 L6 L0 | A0 L3 L2 | L2 L3 A0 | A3 | A4 L8 L7 | A5 | L10 L9 A6 | A7
sketch "Sketch5" plane through (0, -18.5, 24) normal (0, 0, 1) x (1, 0, 0)
  circle A0 centre (5, 29) radius 2.5 projected
  circle A1 centre (5, 29) radius 3
  point P0 (0, 18.5)
  dimension "d44" = 6
extrude "Extrusion5" cut sketch "Sketch5" against normal through all contours A0 | A1
sketch "Sketch6" plane through (0, 19, -2) normal (0, 0, 1) x (1, 0, 0)
  circle A0 centre (5, -8.5) radius 6.5 projected
  point P0 (0, -19)
extrude "Extrusion6" cut sketch "Sketch6" against normal blind 4
sketch "Sketch7" plane through (10, 19, 2) normal (0, 0, -1) x (-1, 0, 0)
  circle A0 centre (5, -8.5) radius 6.5 projected
  point P0 (10, -19)
extrude "Extrusion7" cut sketch "Sketch7" against normal blind 4
sketch "Sketch8" plane through (10, 0, 0) normal (1, 0, 0) x (0, 0, -1)
  line L0 (-2, 14.6533) -> (-2, 19) projected
  line L1 (-2, 19) -> (2, 19)
  line L2 (2, 19) -> (2, 21)
  line L3 (2, 21) -> (-2, 21)
  line L4 (-2, 21) -> (-2, 19)
  point P0 (0, 0)
  dimension "d51" = 2
extrude "Extrusion8" cut sketch "Sketch8" against normal through all
properties part number "guidance_block" material "PET Plastic"
